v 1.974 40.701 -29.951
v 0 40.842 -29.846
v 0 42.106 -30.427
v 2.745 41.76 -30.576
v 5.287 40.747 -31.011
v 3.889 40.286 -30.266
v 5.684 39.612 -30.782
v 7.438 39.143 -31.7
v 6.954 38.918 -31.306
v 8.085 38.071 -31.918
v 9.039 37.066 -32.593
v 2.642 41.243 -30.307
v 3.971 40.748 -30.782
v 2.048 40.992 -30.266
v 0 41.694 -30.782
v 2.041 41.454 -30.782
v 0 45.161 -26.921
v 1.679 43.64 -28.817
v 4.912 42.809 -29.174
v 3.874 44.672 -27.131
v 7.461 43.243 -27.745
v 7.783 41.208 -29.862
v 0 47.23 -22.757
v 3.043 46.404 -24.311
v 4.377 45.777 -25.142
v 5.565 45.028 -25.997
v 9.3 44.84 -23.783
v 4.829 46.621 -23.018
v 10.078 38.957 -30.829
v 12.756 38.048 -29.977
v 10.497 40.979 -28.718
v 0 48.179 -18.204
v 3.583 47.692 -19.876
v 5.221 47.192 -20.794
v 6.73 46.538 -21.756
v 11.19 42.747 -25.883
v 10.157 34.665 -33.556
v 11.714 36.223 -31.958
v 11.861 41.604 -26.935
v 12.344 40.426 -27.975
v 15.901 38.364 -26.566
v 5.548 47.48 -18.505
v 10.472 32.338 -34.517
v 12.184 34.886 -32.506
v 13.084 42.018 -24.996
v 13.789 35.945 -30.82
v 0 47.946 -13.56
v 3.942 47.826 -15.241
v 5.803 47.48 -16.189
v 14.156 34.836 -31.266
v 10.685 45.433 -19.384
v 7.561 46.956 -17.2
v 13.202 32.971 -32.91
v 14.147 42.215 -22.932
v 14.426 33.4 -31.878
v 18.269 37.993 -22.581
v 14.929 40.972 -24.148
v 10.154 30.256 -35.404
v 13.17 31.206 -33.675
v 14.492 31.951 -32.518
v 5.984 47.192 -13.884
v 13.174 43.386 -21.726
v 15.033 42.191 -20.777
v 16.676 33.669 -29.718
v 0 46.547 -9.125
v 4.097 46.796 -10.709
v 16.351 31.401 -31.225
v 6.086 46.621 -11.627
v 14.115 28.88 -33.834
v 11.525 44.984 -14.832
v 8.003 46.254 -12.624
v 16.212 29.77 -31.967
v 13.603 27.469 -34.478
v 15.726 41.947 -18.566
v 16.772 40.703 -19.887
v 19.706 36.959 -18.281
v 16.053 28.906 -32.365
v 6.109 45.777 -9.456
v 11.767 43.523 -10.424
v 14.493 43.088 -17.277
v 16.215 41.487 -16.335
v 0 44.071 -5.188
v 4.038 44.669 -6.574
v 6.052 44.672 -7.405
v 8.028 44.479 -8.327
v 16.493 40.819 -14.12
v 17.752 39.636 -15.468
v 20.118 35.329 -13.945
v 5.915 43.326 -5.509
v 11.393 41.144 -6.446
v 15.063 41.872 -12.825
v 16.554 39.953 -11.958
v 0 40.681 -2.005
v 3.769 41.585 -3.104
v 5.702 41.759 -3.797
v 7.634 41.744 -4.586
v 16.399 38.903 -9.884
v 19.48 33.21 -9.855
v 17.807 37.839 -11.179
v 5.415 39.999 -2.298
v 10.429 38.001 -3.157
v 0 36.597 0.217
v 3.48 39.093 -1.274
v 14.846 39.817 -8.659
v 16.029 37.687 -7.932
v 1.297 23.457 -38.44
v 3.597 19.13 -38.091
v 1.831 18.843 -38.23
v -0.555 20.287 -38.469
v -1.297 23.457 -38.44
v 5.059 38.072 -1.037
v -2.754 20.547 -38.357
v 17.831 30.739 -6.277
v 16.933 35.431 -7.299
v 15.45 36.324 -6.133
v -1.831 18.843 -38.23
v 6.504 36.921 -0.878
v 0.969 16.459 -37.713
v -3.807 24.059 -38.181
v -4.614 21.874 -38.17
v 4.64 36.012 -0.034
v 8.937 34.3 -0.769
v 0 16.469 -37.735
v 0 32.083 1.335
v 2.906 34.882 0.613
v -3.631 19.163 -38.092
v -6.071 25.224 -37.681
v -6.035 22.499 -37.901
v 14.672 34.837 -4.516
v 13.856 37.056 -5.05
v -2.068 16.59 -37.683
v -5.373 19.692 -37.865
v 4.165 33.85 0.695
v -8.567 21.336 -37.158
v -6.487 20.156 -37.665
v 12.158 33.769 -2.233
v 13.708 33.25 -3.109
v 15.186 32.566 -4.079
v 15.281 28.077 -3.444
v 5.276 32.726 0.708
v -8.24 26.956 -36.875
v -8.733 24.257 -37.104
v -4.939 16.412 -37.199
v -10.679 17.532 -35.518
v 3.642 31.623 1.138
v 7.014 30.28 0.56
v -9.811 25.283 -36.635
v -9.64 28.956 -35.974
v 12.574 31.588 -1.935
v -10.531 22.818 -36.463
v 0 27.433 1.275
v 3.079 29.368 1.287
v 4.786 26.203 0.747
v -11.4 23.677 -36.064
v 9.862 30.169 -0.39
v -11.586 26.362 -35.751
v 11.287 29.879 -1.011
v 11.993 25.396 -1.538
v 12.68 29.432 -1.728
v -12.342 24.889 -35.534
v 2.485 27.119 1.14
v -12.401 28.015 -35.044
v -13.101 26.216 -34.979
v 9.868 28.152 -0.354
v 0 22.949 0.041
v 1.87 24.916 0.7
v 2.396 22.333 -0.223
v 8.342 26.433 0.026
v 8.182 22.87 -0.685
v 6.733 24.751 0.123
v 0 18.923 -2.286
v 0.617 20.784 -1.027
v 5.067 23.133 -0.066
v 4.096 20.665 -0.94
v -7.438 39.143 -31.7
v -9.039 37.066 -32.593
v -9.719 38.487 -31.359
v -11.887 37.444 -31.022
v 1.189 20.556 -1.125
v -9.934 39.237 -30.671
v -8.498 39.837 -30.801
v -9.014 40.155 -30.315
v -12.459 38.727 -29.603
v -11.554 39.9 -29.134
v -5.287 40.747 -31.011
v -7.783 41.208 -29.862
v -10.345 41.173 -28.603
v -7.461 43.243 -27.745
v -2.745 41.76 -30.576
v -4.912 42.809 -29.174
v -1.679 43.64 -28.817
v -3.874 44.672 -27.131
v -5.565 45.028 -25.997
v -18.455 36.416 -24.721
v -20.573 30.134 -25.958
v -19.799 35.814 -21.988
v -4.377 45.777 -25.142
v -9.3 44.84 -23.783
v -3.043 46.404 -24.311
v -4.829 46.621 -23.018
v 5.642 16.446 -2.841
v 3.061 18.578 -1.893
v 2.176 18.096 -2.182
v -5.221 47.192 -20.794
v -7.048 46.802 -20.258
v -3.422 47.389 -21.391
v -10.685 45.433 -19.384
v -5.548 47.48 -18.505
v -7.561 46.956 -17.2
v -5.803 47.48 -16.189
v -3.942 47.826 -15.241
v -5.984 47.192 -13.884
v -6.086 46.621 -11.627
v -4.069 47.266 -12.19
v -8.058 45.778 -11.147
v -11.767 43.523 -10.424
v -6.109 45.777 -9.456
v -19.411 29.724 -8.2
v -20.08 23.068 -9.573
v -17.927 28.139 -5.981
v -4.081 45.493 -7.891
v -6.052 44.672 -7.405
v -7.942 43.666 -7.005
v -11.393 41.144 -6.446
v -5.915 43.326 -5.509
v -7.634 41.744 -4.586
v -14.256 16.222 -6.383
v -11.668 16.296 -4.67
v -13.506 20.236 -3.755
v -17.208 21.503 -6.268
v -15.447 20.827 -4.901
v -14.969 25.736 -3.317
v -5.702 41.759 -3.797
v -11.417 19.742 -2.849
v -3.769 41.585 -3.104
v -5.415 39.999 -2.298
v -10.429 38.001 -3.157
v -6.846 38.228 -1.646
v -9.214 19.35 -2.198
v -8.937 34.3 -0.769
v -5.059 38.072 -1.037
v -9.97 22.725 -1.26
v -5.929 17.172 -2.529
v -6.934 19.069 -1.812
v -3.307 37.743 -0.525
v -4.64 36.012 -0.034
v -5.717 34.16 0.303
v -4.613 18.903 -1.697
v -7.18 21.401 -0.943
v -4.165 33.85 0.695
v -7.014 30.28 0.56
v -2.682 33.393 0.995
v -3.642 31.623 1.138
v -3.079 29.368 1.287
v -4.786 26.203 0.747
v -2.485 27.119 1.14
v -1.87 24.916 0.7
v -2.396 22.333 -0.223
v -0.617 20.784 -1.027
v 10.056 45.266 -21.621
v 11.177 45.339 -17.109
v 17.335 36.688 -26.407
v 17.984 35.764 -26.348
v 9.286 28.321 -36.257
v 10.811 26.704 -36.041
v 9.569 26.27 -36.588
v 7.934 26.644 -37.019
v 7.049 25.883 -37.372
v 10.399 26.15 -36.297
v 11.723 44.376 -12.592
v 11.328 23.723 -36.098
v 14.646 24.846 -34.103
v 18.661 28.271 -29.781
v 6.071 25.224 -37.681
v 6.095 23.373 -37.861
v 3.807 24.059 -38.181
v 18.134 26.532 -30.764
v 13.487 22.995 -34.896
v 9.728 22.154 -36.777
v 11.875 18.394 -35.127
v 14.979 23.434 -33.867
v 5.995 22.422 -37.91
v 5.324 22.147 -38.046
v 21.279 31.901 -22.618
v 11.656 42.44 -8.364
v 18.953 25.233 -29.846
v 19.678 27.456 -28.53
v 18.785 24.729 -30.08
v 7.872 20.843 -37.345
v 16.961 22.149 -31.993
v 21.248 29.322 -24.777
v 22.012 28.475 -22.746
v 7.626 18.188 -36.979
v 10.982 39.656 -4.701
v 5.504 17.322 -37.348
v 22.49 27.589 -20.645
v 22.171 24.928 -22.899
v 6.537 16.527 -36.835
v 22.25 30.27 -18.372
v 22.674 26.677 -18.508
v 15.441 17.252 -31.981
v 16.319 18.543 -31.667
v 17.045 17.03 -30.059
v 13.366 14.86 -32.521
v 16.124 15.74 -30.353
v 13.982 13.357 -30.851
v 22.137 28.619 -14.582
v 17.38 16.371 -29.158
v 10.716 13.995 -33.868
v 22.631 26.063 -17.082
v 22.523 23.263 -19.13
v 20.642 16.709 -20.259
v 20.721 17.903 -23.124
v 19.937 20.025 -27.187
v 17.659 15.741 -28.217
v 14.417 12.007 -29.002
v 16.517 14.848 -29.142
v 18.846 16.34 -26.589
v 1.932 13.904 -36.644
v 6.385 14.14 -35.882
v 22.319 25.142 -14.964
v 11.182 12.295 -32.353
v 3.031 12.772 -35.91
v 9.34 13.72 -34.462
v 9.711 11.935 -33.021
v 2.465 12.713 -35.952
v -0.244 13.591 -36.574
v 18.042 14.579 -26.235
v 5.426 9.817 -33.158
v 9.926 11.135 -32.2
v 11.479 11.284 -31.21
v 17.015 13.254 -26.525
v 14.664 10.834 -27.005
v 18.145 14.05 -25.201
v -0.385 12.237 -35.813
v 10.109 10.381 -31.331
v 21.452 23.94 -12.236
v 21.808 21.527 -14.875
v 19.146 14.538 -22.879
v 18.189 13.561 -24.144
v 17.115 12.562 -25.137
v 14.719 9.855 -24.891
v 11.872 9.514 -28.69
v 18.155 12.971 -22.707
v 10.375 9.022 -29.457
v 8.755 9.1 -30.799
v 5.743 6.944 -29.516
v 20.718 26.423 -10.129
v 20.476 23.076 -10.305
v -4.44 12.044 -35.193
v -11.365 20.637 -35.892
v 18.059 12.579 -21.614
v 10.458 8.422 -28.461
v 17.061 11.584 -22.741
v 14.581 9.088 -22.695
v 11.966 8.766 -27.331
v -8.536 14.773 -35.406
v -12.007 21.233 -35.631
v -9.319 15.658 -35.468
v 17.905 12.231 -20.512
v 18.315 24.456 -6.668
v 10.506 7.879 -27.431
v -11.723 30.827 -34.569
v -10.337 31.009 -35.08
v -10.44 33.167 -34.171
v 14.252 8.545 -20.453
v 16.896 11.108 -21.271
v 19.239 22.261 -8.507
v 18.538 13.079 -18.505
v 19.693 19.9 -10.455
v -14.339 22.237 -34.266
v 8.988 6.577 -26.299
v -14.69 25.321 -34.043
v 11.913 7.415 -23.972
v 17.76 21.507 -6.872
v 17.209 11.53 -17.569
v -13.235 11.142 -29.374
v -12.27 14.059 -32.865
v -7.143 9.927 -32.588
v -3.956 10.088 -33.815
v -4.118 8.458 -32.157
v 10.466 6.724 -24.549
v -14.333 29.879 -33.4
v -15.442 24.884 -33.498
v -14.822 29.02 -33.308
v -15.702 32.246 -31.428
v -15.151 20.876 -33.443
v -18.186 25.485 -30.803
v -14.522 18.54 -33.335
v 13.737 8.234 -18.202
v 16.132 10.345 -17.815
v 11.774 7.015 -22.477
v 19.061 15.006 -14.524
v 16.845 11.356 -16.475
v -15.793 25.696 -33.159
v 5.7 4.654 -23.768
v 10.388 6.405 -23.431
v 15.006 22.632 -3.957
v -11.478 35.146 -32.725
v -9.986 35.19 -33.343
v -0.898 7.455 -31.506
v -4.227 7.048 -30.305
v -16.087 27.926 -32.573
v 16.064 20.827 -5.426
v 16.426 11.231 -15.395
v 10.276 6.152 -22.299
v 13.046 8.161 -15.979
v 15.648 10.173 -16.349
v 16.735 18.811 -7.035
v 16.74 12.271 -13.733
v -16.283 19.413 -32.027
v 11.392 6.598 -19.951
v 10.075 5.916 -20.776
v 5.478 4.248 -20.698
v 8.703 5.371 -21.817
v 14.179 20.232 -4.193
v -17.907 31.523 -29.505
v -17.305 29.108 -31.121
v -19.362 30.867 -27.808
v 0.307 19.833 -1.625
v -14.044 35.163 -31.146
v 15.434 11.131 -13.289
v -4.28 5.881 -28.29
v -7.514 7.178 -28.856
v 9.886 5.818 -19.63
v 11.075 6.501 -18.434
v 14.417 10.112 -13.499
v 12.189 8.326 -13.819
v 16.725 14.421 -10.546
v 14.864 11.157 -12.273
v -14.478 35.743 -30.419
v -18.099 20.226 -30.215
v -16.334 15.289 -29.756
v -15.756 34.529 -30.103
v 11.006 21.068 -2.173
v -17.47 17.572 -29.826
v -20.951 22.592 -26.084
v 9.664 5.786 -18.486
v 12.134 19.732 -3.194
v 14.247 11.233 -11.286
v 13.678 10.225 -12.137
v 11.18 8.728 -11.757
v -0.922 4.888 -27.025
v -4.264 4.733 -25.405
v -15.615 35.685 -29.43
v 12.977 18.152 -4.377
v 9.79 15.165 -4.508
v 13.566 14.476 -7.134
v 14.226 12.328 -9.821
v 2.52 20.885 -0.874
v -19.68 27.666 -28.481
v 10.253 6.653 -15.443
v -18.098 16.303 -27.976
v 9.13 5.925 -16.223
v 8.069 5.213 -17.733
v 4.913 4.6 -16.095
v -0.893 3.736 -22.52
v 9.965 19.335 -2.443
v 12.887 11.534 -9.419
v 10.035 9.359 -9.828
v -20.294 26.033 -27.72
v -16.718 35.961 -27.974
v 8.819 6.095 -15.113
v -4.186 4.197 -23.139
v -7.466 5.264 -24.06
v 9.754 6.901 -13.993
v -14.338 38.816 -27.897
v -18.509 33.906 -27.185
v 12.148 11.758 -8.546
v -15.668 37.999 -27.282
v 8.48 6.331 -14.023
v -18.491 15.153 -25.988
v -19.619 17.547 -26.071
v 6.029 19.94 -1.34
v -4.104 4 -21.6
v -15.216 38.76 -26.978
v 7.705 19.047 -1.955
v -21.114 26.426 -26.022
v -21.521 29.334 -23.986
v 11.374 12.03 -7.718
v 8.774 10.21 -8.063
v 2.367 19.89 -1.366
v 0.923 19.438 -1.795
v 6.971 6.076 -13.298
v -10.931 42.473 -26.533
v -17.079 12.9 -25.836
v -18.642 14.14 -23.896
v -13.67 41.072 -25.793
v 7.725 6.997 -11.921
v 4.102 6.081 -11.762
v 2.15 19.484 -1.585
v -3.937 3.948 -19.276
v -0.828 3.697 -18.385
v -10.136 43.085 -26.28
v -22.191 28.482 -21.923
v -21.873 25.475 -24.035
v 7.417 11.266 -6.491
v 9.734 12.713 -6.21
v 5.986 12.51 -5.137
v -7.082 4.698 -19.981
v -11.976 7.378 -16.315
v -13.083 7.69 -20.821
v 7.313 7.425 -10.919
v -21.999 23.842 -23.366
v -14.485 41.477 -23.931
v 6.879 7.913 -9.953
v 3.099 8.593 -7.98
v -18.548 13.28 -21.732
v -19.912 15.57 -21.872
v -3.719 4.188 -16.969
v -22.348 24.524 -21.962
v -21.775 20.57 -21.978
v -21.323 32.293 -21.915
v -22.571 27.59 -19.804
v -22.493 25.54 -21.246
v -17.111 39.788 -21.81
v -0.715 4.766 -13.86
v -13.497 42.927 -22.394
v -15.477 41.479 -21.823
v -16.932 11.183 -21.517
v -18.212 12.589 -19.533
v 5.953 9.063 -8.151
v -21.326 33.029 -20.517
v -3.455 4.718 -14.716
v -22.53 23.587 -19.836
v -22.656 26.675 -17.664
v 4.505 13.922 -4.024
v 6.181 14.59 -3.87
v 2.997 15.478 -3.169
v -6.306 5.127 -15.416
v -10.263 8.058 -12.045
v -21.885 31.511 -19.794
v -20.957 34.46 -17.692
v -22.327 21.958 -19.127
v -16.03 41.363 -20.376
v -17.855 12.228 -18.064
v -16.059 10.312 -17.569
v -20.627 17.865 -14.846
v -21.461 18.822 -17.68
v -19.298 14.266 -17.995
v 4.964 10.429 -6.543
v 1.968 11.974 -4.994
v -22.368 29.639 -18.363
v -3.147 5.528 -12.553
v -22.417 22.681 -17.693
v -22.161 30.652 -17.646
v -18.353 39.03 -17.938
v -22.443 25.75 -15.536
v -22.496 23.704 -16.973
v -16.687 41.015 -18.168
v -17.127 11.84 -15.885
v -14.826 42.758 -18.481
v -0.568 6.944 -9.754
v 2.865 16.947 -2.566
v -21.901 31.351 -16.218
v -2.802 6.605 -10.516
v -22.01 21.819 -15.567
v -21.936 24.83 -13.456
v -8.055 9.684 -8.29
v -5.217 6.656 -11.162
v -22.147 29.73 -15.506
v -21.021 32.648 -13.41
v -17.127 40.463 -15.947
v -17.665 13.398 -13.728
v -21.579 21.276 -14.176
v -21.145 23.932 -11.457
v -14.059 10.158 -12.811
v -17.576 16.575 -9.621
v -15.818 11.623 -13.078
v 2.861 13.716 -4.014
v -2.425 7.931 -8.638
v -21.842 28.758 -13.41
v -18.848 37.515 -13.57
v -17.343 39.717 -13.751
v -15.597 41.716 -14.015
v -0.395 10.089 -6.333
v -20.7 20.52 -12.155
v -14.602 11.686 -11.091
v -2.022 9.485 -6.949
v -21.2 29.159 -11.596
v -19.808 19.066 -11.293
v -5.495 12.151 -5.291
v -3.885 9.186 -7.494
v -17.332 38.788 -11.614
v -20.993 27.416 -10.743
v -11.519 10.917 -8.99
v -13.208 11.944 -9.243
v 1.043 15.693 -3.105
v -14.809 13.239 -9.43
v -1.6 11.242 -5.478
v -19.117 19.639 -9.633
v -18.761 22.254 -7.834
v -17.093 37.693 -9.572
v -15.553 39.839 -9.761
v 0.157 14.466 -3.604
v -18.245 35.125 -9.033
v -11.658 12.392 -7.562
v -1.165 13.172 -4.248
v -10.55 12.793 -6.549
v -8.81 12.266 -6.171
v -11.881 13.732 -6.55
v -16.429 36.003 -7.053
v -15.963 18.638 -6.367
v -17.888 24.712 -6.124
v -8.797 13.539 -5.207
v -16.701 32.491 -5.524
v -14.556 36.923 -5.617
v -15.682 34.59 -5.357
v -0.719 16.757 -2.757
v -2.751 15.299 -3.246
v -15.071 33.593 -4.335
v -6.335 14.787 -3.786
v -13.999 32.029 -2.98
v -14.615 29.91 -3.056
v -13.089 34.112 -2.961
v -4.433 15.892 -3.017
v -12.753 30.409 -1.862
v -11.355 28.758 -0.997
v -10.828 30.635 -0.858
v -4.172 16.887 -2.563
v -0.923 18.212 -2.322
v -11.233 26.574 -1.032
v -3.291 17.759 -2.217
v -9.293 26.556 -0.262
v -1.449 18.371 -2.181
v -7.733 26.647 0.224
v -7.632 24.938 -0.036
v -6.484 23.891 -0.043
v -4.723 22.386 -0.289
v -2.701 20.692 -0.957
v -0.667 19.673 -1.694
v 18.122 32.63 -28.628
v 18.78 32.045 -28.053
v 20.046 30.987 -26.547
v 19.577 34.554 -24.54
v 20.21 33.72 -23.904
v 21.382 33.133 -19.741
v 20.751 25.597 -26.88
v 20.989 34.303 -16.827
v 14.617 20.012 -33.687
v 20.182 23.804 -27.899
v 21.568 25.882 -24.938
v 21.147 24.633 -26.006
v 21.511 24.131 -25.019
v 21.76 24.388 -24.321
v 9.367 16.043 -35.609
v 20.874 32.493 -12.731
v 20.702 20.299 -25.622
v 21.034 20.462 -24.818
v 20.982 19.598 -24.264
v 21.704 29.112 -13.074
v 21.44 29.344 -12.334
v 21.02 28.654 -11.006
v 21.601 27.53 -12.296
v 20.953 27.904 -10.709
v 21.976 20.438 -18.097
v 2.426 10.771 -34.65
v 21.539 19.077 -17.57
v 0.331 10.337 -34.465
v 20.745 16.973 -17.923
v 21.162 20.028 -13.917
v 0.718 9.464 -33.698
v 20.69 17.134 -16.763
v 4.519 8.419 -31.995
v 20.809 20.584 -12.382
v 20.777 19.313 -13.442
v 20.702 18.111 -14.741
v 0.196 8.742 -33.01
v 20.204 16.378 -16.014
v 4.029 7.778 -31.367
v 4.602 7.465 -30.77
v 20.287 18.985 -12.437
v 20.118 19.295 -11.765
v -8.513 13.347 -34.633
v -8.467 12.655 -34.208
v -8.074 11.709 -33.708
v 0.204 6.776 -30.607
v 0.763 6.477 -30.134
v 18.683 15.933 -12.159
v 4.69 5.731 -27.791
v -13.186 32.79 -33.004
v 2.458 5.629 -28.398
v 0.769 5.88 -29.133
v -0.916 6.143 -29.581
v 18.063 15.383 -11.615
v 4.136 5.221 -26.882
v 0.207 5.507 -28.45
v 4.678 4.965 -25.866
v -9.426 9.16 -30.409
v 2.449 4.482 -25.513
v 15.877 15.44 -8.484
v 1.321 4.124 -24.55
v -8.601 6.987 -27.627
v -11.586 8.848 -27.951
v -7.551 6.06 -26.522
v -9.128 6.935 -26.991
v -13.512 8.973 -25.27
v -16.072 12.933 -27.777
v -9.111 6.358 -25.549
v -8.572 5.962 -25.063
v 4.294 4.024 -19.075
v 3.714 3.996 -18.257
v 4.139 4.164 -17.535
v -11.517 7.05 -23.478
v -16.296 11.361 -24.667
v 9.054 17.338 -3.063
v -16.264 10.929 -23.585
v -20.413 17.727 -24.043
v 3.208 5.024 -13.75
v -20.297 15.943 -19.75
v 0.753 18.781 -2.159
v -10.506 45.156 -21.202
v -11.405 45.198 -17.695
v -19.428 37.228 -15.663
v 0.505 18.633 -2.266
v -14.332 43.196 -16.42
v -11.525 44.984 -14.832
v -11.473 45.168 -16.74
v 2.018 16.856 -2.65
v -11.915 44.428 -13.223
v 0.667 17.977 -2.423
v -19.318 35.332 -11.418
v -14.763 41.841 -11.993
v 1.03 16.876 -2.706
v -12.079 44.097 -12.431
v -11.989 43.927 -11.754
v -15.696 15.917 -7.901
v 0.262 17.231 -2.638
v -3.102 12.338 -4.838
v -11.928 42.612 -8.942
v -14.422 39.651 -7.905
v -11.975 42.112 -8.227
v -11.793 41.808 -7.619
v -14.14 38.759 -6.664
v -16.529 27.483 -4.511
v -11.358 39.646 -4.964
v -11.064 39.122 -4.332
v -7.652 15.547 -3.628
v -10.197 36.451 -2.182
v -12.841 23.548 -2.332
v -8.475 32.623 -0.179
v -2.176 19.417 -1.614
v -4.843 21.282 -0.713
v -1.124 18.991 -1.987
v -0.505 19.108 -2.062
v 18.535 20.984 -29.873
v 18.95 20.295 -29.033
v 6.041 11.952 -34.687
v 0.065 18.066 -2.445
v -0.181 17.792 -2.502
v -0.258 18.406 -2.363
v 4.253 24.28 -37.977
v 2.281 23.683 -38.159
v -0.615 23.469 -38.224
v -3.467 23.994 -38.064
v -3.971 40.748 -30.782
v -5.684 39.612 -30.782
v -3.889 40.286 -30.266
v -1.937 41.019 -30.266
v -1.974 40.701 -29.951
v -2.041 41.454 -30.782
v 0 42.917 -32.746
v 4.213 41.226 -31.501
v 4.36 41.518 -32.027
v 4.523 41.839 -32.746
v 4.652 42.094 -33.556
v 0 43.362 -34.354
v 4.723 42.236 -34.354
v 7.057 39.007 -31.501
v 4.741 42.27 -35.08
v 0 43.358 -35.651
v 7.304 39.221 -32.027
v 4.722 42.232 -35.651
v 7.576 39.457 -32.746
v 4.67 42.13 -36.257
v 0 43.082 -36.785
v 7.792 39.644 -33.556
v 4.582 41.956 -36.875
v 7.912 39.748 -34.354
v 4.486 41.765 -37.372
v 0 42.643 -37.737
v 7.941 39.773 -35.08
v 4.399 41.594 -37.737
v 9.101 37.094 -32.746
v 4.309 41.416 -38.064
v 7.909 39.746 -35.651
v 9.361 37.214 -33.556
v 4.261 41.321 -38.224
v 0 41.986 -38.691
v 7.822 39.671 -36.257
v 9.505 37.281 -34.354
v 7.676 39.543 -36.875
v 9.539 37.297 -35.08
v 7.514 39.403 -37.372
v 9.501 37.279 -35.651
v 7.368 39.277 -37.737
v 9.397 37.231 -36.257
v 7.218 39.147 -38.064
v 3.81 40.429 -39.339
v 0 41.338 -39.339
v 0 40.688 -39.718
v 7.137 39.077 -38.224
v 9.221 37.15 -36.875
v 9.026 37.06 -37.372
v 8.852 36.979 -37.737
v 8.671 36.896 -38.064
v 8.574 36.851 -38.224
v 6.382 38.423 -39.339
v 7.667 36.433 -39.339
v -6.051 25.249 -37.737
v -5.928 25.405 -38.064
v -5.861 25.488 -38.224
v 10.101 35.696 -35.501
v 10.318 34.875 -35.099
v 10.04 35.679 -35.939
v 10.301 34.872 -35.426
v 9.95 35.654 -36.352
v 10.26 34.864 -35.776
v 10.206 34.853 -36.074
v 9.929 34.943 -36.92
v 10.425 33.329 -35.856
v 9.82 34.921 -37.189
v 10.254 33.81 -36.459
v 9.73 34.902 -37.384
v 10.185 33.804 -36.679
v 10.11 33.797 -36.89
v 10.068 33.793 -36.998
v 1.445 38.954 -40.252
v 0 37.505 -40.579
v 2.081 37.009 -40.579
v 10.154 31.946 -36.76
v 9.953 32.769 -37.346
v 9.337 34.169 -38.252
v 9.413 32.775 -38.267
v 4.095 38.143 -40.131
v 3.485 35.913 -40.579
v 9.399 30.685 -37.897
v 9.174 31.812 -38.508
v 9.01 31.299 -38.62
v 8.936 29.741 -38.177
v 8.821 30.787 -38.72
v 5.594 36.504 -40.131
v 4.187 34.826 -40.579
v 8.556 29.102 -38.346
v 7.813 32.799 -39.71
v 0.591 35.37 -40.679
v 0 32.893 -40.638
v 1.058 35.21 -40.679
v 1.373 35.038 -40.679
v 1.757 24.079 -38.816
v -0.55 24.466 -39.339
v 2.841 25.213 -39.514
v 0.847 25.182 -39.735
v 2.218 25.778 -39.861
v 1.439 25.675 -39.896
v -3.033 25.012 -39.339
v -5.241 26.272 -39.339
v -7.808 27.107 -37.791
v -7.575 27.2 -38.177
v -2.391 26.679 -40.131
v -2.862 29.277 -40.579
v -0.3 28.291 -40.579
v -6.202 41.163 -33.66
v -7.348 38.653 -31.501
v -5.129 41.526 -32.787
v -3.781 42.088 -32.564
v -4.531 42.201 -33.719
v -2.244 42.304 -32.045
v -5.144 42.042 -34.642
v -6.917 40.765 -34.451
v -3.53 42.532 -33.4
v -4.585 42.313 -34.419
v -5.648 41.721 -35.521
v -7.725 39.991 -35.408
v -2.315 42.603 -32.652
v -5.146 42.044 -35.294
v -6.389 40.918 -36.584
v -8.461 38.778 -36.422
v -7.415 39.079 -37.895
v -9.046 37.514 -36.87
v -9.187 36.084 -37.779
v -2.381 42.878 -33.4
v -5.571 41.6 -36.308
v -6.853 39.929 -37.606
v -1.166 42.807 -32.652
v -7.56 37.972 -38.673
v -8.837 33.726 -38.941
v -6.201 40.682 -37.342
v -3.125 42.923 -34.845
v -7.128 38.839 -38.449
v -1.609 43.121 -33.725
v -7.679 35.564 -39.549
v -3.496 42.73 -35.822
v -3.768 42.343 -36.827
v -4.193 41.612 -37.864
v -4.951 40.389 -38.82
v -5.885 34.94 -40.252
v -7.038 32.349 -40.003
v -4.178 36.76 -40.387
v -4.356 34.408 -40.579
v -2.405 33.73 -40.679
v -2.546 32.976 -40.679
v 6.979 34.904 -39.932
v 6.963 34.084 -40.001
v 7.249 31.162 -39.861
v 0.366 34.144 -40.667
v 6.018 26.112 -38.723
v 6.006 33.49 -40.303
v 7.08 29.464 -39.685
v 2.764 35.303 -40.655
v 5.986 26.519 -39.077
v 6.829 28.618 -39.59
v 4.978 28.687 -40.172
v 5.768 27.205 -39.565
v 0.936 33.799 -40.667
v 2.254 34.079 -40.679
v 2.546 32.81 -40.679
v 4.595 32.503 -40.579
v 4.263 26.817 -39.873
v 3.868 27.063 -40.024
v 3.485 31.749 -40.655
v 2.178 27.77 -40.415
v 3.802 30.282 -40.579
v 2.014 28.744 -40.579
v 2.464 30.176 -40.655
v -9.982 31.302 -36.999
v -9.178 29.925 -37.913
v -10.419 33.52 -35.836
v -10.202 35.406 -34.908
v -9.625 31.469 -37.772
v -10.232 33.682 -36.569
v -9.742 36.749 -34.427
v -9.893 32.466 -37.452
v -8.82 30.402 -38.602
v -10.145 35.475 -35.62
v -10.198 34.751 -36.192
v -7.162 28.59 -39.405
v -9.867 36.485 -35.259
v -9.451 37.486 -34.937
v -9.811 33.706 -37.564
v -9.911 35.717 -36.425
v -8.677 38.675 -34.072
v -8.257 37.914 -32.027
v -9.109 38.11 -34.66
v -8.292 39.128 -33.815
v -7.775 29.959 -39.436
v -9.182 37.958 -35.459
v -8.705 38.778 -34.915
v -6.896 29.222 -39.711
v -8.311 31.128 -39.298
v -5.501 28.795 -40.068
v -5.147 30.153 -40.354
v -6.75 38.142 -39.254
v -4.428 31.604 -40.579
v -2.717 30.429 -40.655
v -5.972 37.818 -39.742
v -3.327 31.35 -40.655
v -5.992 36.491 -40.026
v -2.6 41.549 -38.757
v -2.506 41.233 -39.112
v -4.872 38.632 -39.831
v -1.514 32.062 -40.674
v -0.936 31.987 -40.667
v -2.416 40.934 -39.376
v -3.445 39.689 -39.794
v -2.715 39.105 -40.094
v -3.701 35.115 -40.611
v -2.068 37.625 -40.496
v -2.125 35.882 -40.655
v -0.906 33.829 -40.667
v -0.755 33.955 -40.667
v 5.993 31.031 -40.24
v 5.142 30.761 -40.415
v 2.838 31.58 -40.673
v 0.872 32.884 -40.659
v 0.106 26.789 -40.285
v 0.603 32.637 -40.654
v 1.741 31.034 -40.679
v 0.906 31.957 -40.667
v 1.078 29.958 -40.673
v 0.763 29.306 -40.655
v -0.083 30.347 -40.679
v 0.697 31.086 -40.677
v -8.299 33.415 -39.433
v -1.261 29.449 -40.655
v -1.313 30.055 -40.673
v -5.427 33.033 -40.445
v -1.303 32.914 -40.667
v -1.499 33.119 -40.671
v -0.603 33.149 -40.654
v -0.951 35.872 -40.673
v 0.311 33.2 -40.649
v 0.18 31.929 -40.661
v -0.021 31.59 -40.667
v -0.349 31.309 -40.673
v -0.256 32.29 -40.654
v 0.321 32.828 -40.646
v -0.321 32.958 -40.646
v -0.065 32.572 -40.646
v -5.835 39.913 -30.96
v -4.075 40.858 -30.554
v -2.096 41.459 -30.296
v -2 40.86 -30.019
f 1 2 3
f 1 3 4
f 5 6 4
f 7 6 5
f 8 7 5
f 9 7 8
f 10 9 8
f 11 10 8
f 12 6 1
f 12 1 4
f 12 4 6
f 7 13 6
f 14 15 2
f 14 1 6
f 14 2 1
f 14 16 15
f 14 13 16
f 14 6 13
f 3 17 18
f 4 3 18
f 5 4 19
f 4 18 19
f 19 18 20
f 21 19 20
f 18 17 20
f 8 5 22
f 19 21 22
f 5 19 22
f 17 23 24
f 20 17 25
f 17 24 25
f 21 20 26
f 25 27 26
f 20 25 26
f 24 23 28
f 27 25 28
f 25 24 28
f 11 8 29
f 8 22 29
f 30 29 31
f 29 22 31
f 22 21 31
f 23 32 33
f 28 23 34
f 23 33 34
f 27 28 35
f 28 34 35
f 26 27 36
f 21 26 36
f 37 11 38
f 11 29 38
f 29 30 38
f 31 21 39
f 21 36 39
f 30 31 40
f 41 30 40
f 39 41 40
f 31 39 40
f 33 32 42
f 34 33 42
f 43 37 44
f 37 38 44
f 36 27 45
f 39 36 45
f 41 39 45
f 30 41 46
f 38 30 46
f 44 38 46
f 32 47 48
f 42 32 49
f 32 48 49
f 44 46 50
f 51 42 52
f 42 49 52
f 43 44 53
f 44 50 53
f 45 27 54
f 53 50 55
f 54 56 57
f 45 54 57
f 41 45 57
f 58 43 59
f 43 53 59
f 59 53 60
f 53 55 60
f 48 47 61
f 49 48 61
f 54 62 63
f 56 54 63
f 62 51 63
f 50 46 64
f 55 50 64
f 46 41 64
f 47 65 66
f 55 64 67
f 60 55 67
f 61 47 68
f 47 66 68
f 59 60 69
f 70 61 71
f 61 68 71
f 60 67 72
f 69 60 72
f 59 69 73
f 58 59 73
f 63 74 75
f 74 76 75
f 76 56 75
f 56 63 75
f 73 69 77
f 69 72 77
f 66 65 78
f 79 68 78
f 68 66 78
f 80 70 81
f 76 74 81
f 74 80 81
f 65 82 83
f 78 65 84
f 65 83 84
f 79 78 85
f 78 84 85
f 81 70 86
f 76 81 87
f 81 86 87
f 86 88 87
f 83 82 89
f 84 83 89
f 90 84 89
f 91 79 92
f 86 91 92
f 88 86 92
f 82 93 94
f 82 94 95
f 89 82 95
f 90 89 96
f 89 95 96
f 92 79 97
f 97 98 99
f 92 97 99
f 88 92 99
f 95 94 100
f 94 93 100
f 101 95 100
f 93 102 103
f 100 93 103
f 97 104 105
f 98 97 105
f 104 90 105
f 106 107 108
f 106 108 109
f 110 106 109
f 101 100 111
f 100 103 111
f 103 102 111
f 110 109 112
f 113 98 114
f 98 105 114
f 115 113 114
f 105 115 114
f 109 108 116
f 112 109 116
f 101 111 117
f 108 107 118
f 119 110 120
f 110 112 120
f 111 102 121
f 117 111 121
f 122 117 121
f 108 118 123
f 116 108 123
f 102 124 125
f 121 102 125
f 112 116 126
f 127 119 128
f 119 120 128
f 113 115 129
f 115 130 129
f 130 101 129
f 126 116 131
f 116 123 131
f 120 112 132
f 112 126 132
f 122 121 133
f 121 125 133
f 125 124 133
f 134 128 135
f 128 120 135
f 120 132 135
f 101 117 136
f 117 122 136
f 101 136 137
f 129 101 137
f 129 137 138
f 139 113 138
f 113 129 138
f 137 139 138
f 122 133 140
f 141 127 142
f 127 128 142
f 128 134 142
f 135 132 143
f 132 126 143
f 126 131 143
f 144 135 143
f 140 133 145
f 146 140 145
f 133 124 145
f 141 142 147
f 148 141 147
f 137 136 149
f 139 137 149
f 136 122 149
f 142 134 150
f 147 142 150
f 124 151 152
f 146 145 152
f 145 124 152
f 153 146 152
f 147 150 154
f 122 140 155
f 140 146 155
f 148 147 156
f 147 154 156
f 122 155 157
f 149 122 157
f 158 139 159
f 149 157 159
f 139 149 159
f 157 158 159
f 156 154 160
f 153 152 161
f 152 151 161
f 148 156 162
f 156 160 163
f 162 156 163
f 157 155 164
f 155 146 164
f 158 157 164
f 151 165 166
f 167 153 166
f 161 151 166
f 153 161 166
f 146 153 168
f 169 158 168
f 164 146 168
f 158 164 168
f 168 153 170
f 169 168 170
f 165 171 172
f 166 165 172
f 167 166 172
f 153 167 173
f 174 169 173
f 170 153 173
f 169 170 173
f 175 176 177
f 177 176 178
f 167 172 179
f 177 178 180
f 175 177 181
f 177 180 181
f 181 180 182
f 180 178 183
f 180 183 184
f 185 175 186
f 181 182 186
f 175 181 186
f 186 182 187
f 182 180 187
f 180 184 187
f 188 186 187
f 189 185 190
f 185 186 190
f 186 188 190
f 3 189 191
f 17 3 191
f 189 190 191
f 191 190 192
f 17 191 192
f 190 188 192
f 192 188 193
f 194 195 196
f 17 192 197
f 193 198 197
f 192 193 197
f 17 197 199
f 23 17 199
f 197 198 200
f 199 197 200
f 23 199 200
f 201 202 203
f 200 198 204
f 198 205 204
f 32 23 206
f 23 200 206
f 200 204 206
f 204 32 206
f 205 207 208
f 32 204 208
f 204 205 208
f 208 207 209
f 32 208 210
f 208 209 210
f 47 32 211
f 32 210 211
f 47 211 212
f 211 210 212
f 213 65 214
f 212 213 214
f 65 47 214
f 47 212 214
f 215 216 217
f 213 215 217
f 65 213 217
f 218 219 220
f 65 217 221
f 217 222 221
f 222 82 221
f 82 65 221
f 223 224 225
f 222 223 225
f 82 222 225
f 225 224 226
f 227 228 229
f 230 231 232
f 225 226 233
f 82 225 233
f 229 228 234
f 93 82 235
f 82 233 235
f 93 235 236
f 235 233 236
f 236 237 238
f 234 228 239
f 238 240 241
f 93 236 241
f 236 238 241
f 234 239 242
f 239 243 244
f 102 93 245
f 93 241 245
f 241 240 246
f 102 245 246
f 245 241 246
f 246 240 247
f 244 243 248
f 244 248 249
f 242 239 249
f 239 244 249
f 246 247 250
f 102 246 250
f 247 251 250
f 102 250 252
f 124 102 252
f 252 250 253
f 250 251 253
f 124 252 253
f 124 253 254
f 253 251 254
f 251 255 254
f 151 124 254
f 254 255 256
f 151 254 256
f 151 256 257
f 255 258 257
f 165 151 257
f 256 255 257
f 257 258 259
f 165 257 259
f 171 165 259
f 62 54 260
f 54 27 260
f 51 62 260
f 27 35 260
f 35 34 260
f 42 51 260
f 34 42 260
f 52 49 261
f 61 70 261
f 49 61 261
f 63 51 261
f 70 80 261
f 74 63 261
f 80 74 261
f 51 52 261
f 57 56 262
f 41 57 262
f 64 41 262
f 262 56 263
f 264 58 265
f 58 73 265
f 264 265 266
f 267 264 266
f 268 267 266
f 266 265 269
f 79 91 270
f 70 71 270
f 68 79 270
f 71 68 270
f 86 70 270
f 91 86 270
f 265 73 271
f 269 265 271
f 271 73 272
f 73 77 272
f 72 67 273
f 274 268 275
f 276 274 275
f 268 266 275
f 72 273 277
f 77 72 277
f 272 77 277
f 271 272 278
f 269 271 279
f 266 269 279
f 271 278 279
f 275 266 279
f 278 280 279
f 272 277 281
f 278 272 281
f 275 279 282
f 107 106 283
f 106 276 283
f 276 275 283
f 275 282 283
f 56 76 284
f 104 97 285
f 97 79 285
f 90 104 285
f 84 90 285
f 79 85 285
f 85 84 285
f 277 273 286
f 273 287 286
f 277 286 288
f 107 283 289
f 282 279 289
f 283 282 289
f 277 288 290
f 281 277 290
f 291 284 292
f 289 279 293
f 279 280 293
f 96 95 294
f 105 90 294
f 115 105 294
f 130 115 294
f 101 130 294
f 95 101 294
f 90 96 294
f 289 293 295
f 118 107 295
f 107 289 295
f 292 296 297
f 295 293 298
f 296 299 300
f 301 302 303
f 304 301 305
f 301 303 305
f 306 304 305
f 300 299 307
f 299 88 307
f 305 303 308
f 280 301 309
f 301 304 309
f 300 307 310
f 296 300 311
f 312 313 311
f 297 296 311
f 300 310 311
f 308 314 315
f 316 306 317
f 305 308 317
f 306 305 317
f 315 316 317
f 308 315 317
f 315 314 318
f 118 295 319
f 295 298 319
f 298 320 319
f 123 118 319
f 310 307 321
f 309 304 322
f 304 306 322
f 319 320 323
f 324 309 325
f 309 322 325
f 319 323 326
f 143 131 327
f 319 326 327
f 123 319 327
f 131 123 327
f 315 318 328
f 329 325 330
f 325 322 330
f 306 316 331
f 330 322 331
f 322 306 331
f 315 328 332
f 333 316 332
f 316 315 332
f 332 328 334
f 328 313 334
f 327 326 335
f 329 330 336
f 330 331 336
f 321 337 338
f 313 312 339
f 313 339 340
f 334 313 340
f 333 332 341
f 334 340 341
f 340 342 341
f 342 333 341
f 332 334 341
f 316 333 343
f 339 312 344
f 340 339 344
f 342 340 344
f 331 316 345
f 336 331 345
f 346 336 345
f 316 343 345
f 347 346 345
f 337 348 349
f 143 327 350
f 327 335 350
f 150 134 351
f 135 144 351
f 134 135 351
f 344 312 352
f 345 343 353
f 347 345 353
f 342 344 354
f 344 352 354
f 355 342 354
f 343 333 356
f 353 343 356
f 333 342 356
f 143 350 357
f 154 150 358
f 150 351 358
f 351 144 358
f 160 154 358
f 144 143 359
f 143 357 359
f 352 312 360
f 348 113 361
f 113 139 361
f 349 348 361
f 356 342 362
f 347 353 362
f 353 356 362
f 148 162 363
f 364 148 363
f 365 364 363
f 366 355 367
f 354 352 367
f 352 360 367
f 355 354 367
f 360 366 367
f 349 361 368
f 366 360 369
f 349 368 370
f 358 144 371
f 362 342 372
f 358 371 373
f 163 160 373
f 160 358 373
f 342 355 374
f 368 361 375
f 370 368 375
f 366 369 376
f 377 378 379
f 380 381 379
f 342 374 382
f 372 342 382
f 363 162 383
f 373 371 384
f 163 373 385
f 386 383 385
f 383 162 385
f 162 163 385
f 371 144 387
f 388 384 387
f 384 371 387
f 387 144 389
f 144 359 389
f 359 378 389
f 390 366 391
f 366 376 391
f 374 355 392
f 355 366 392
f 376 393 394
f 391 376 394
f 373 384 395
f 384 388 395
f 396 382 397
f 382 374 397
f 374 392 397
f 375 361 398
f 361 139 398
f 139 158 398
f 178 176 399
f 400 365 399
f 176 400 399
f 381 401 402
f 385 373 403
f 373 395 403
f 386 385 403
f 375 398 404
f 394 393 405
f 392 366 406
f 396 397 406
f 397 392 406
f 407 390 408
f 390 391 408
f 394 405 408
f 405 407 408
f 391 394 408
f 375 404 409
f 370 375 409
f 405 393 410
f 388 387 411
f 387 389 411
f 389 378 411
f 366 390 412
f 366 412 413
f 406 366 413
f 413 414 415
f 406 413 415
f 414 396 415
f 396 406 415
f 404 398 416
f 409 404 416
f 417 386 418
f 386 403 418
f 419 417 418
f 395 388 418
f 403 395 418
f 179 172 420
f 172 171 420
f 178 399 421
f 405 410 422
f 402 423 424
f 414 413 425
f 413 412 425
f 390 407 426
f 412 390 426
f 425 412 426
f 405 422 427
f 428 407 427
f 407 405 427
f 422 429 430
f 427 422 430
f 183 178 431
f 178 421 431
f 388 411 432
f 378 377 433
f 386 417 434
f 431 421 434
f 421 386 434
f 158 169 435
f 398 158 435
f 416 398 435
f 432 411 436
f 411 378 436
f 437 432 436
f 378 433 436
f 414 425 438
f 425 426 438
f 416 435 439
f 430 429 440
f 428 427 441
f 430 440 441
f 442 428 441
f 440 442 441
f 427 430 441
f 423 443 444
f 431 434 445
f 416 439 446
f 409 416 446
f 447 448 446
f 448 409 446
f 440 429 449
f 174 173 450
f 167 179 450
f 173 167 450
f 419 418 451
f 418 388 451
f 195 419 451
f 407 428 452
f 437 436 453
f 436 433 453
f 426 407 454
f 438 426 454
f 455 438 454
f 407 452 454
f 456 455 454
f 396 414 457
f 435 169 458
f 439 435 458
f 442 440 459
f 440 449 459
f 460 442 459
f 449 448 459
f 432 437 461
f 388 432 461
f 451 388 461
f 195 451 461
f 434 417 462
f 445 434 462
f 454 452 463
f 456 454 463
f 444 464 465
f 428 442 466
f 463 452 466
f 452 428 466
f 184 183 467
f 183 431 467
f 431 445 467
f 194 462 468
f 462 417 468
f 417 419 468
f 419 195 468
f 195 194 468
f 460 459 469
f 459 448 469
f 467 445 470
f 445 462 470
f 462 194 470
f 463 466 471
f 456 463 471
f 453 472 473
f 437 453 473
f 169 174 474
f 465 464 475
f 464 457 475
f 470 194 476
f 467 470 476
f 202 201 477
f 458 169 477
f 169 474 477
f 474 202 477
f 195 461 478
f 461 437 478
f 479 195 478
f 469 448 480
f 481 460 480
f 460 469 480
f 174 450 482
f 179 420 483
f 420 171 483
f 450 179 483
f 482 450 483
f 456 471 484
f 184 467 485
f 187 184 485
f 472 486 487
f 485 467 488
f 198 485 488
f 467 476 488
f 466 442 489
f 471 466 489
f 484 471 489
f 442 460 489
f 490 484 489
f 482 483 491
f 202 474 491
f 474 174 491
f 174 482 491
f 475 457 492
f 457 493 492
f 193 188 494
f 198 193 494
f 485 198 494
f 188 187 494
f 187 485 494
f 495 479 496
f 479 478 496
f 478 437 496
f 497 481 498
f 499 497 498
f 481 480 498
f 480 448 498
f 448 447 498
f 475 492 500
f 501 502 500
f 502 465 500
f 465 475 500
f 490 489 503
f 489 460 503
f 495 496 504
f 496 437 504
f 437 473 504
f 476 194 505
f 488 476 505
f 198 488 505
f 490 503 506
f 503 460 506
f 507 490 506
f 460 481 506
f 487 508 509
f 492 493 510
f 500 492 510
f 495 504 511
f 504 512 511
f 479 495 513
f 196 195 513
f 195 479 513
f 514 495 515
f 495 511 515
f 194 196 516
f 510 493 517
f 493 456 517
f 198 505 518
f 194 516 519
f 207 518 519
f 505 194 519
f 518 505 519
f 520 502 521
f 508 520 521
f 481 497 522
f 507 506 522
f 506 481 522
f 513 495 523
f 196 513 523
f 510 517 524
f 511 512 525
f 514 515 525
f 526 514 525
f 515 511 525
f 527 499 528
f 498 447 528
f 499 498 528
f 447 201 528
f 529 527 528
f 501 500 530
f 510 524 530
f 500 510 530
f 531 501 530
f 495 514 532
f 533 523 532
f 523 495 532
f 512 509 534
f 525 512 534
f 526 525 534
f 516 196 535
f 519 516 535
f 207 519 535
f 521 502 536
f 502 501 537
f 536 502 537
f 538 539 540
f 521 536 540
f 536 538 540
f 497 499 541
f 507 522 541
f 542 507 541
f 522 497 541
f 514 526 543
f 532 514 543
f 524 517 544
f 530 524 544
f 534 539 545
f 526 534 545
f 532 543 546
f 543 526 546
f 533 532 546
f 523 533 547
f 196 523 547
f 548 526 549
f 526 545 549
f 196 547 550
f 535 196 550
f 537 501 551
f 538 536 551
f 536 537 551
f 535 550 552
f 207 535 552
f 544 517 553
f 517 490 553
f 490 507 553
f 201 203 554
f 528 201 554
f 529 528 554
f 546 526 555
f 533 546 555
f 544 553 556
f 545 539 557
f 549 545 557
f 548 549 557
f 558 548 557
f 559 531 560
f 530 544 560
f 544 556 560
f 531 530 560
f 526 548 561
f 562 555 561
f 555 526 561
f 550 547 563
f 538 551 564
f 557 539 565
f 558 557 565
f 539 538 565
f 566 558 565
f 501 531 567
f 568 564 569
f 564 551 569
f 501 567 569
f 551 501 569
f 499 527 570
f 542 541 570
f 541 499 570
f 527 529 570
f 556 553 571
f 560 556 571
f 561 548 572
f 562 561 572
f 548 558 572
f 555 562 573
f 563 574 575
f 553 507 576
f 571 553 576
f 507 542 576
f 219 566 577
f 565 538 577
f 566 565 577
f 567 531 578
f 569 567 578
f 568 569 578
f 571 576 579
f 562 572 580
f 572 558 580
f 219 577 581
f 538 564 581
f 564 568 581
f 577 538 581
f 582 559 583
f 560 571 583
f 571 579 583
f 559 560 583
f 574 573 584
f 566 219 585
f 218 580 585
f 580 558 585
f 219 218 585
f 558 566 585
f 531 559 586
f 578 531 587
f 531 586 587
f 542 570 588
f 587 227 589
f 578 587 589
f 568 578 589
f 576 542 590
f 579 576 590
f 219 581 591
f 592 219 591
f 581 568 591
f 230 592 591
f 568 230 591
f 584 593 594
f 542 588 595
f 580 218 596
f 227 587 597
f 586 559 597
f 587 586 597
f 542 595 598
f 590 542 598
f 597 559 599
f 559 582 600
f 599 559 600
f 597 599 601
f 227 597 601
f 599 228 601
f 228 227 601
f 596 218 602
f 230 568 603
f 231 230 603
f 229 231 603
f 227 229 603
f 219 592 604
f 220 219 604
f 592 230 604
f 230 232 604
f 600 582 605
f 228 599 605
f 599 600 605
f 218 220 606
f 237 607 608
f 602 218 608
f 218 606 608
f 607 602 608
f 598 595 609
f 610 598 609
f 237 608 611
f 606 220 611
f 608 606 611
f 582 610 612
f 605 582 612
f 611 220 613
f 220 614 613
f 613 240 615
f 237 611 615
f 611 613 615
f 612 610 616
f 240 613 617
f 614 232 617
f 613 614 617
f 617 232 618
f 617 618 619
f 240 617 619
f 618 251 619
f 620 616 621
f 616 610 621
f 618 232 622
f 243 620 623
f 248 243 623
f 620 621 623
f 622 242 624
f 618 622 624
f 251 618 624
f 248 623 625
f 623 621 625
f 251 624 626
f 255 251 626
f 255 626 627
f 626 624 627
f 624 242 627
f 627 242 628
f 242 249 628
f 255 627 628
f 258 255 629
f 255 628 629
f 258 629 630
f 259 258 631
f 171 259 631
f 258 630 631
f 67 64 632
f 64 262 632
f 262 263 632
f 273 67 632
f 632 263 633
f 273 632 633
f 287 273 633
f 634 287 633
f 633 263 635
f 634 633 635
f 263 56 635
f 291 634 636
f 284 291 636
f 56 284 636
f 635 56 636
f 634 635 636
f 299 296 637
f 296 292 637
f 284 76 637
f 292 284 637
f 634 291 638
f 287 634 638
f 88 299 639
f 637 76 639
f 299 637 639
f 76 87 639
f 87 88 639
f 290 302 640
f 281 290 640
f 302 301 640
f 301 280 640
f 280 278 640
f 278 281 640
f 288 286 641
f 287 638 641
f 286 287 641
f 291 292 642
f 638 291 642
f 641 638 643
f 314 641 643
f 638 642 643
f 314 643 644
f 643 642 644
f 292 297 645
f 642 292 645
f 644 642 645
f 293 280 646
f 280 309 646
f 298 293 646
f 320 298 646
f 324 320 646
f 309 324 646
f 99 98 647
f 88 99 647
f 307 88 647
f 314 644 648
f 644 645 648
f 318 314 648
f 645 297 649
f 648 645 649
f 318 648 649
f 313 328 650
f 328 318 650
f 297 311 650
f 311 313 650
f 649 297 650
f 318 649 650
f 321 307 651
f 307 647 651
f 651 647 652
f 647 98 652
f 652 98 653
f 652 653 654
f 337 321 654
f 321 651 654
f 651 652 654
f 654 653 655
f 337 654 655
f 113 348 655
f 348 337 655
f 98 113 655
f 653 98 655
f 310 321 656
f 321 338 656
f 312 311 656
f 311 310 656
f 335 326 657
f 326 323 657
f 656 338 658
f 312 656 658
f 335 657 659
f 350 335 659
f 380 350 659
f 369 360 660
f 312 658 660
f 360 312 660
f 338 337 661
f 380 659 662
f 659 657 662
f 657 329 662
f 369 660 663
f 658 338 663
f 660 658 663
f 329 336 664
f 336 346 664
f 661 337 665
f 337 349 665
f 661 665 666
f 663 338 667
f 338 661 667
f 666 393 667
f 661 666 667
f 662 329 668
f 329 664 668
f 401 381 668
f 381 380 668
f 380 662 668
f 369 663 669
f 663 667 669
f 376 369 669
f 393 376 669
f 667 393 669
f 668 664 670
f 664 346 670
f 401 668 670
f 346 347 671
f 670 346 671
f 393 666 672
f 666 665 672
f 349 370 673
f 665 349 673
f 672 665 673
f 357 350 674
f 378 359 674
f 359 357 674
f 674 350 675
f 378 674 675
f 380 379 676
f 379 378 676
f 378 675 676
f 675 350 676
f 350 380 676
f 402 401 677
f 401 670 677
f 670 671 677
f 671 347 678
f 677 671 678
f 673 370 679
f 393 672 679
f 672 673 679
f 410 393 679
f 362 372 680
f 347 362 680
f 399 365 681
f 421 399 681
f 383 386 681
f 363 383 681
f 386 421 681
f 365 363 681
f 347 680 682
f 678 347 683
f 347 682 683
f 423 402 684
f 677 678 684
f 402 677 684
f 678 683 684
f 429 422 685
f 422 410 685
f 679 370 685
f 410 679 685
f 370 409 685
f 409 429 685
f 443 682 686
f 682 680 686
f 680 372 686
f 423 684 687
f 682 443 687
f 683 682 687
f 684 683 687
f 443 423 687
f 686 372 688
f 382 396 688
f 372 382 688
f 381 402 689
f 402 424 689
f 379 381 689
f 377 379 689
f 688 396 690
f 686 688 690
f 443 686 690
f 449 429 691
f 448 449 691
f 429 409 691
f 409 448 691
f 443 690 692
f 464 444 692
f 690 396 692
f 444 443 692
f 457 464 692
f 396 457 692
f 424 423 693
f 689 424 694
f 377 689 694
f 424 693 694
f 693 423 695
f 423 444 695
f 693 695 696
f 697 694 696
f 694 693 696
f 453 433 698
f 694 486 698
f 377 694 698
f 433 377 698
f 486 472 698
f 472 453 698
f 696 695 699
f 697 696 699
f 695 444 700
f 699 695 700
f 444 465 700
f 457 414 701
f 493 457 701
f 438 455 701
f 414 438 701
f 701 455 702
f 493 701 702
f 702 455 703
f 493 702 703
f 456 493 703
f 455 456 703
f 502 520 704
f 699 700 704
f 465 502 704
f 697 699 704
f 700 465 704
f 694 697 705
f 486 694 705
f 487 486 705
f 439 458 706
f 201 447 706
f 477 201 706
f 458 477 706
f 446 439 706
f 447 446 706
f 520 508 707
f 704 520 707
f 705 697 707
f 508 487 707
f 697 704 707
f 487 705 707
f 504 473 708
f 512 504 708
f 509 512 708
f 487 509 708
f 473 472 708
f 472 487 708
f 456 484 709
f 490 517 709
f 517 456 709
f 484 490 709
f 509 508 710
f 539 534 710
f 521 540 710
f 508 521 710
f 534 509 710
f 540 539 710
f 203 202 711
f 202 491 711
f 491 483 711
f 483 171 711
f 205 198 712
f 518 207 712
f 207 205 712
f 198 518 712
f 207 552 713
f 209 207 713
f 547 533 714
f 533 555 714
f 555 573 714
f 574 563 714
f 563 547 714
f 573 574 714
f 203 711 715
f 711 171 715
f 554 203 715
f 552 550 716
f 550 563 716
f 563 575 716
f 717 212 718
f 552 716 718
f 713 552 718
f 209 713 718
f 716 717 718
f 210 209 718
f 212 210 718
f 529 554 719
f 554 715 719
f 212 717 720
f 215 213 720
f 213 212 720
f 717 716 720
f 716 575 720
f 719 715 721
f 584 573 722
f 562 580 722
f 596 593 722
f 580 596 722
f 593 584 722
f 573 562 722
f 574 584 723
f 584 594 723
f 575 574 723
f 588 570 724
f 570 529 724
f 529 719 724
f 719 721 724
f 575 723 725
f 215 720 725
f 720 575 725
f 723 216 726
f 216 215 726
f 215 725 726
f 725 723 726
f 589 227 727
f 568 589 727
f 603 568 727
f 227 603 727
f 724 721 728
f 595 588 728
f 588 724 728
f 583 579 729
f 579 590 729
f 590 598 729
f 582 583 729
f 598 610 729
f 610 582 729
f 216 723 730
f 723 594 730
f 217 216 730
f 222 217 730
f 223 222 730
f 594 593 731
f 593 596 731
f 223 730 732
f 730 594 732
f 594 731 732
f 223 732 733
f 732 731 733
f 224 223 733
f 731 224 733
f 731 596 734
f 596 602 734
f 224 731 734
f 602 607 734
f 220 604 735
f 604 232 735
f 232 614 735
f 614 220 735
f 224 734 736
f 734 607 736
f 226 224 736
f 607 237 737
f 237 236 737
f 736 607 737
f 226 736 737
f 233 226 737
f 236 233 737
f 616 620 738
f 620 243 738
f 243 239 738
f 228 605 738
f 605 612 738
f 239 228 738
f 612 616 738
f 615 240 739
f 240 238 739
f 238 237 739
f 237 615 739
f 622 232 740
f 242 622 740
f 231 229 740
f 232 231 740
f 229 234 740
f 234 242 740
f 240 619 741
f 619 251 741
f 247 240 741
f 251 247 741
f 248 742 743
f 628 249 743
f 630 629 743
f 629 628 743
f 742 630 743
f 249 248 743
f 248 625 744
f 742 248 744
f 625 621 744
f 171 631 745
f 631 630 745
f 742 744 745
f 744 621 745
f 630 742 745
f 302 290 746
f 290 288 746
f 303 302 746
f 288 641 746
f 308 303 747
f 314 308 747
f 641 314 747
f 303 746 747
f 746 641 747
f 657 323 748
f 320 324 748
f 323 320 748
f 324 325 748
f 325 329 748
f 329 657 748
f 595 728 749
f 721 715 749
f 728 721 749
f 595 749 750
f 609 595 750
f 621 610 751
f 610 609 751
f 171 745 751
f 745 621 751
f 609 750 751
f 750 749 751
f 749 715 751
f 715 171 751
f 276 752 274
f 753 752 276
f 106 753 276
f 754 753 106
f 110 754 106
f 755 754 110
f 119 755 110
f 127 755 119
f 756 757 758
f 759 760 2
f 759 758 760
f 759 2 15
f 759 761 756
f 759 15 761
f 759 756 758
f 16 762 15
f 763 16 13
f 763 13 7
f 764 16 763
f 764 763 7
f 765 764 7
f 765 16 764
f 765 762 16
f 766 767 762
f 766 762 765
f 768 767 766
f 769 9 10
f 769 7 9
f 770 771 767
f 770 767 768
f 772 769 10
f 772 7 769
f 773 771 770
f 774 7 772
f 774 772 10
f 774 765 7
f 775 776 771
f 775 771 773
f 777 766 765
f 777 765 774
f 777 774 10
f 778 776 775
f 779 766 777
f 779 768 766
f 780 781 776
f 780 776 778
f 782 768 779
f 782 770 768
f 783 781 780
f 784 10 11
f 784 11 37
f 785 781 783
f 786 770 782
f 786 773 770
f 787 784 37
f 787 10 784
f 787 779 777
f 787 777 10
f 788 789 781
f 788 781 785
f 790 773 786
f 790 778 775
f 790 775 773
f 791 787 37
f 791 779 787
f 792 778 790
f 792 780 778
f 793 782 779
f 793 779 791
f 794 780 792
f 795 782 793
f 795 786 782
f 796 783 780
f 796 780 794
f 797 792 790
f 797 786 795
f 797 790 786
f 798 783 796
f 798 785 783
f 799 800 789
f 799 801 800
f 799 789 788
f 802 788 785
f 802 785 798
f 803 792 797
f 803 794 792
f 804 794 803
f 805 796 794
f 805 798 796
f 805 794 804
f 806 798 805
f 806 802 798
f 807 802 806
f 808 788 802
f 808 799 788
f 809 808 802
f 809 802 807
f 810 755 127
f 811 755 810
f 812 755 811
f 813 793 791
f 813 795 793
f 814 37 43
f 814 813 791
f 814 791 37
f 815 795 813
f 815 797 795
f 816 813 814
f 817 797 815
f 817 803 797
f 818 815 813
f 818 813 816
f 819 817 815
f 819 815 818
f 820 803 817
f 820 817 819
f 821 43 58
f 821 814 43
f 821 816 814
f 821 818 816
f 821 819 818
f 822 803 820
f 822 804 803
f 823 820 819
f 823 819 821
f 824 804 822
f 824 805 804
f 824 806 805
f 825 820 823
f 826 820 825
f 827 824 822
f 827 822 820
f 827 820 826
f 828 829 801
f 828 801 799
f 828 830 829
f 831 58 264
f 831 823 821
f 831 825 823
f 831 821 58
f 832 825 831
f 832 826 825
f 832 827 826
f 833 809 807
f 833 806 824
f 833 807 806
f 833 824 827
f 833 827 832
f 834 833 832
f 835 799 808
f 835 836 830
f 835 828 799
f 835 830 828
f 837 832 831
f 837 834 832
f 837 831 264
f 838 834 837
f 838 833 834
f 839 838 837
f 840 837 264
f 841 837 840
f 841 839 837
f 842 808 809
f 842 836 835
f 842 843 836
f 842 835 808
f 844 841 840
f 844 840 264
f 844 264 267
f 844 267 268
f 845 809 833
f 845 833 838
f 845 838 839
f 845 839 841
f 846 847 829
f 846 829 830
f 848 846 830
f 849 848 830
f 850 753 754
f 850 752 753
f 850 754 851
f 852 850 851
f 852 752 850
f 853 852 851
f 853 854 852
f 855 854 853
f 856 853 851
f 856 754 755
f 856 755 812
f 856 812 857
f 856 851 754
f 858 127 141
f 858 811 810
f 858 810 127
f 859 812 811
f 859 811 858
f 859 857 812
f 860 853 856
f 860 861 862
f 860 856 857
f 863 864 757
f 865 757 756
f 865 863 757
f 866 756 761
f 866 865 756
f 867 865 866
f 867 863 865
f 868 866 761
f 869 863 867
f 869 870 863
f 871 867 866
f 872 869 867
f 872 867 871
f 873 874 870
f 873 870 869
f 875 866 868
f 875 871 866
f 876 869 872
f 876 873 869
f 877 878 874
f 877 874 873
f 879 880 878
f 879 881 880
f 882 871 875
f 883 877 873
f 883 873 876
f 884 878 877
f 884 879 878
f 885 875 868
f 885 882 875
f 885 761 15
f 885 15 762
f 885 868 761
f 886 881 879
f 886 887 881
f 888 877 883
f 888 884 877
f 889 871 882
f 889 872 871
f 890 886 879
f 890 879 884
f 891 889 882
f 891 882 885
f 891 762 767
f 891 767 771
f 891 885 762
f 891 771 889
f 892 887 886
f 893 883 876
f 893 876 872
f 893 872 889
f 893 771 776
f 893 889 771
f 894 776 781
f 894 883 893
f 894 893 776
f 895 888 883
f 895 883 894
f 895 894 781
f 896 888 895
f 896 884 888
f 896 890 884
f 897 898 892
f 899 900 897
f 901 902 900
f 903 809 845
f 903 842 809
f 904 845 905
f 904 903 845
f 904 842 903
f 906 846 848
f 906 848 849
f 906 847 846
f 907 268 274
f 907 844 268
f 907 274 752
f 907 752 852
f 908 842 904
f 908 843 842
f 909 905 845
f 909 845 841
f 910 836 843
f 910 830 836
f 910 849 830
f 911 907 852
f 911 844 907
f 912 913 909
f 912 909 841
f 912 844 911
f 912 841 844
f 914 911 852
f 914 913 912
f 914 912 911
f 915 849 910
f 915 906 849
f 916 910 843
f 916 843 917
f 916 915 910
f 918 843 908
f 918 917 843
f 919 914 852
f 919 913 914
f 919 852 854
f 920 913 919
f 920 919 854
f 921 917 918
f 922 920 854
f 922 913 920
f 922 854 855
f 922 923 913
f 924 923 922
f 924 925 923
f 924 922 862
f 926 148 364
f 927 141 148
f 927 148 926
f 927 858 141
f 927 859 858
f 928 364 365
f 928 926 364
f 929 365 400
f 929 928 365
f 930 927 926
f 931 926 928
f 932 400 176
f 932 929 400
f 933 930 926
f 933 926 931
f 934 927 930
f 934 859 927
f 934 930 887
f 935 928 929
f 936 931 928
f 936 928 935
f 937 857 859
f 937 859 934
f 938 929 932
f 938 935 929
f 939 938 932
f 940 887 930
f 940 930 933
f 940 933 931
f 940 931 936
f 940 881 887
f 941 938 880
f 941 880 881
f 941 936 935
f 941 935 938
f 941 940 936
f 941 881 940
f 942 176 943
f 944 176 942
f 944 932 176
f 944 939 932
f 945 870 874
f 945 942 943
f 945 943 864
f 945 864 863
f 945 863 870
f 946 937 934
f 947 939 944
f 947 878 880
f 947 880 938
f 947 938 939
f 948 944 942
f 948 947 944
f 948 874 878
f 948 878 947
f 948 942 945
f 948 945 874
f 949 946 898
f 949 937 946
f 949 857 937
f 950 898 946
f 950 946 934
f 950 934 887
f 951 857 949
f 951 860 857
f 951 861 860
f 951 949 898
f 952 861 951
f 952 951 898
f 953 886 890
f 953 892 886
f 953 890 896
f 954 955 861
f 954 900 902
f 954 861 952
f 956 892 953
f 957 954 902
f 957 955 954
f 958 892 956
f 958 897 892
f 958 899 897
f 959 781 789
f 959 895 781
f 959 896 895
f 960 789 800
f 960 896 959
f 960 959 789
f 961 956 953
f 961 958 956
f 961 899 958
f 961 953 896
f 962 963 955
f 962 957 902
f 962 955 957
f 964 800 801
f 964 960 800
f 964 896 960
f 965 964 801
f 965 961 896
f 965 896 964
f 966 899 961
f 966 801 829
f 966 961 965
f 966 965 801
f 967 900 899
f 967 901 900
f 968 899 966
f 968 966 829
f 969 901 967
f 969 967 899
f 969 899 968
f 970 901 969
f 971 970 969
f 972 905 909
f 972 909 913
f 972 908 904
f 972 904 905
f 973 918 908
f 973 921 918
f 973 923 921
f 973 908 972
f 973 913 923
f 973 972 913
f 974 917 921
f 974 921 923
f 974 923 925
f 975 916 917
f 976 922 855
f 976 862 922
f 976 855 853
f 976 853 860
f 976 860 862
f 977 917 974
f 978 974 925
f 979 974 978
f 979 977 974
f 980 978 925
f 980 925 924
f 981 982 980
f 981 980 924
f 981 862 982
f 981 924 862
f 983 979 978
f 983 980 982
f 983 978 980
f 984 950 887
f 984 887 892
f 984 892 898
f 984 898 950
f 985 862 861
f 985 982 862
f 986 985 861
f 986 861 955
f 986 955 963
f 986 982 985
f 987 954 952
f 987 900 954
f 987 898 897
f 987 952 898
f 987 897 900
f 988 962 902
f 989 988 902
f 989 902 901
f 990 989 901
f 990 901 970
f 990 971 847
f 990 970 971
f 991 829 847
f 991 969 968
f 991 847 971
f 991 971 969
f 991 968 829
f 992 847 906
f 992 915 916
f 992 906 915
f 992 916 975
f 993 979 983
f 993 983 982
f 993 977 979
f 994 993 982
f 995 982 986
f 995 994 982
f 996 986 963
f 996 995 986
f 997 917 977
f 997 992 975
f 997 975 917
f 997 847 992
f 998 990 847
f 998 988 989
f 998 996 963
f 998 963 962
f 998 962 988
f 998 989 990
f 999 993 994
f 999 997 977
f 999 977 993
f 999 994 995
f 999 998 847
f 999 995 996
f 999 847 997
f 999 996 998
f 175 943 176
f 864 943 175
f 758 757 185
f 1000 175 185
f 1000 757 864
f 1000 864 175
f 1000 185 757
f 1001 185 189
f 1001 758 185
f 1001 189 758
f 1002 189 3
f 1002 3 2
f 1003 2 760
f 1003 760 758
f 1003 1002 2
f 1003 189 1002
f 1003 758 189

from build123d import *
from build123d import SkipClean  # not in build123d's __all__


with BuildPart() as f1:
    # F0 (on Right) → F1 (revolve)
    with BuildSketch(Plane.YZ):
        with BuildLine():
            add(Edge.make_bspline(
                [(40.8417056283, -29.8455245679), (37.35877147, -28.4480000079), (32.8929983079, -28.4480000079)],
                knots=[0.8945338201, 0.8945338201, 0.8945338201, 1.5707963268, 1.5707963268, 1.5707963268], degree=2, weights=[1, 0.9433762219, 1]))
            add(Edge.make_bspline(
                [(42.105613437, -30.4271384657), (41.5130824533, -30.1149139847), (40.8417056283, -29.8455245679)],
                knots=[0.7591769731, 0.7591769731, 0.7591769731, 0.8945338201, 0.8945338201, 0.8945338201], degree=2, weights=[1, 0.9977106895, 1]))
            ThreePointArc((42.105613437, -30.4271384657), (44.0714983156, -5.1881798652), (18.9229976386, -2.2859999444))
            Line((18.9229976386, -2.2859999444), (30.2253543952, -28.589665369))
            add(Edge.make_bspline(
                [(32.8929983079, -28.4480000079), (31.5441300596, -28.4480000079), (30.2253543952, -28.589665369)],
                knots=[1.5707963268, 1.5707963268, 1.5707963268, 1.782423145, 1.782423145, 1.782423145], degree=2, weights=[1, 0.9944069827, 1]))
        make_face()
    revolve(axis=Axis((0, 25.9079979733, -18.5419999762), (0, 0.3947854392, -0.9187733436)))

    # F0 (on Right) → F2 (revolve)
    with BuildSketch(Plane.YZ):
        with BuildLine():
            add(Edge.make_bspline(
                [(40.8417056283, -29.8455245679), (41.1604426392, -30.1623492327), (41.4435980593, -30.4745855709), (41.6942473899, -30.7816924182)],
                knots=[0, 0, 0, 0, 0.0255071894, 0.0255071894, 0.0255071894, 0.0255071894], degree=3))
            add(Edge.make_bspline(
                [(40.8417056283, -29.8455245679), (37.35877147, -28.4480000079), (32.8929983079, -28.4480000079)],
                knots=[0.8945338201, 0.8945338201, 0.8945338201, 1.5707963268, 1.5707963268, 1.5707963268], degree=2, weights=[1, 0.9433762219, 1]))
            Line((32.8929983079, -28.4480000079), (32.8929983079, -34.7980000079))
            Line((32.8929983079, -34.7980000079), (32.8929983079, -40.6381264329))
            add(Edge.make_bspline(
                [(41.6942473899, -30.7816924182), (44.6618466499, -34.4177286711), (42.3020218601, -38.7497275544), (40.7608179336, -39.7736108081), (38.7694217239, -40.3810728072), (36.8220473508, -40.7352669513), (34.3392785671, -40.673359824), (32.8929983079, -40.6381264329)],
                knots=[0.0255071894, 0.0255071894, 0.0255071894, 0.0255071894, 0.3275032737, 0.4739978855, 0.6255118689, 0.7806480871, 1, 1, 1, 1], degree=3))
        make_face()
    with SkipClean():  # cleaning this boolean's faces spoils the solid; the shape is the same uncleaned
        revolve(axis=Axis((0, 32.8929983079, -34.7980000079), (0, 0, -1)))


solid = f1.part
